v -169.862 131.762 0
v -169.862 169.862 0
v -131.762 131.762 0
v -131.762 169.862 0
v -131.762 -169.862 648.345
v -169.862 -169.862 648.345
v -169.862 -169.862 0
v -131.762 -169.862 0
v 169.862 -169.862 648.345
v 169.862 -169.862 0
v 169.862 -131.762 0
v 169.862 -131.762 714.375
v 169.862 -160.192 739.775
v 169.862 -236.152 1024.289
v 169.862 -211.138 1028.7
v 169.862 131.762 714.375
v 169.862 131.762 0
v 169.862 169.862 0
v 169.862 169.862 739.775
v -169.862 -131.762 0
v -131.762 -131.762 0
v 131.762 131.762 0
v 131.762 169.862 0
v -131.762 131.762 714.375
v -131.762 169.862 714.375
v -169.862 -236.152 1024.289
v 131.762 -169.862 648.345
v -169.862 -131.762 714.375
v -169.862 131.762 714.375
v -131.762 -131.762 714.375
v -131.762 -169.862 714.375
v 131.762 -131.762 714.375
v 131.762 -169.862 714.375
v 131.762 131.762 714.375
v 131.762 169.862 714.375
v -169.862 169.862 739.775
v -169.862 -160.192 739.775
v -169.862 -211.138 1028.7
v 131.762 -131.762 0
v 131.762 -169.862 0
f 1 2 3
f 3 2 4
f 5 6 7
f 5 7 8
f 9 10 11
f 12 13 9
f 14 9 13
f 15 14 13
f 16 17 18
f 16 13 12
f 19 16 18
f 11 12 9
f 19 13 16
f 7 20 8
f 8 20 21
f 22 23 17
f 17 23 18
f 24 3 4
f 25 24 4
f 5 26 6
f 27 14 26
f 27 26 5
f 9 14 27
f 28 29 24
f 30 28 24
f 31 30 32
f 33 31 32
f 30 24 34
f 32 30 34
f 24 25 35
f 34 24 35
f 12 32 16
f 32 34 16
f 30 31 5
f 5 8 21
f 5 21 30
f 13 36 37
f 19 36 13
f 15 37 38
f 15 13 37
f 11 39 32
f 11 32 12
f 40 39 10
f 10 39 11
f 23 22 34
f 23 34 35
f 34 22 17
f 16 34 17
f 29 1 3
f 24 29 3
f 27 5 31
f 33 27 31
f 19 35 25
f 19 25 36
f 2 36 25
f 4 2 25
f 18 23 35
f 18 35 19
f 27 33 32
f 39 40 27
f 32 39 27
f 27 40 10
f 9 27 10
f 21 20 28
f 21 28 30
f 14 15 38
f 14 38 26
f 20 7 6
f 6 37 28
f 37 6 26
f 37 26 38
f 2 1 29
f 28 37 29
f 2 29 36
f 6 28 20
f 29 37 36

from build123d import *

# Parameters (mm, degrees)
F0_W          = 38.1
F0_H          = 38.1
F1_DEPTH      = 739.775
F3_DEPTH      = 25.4
F6_DEPTH      = 169.8625
F6_DEPTH_BACK = 169.8625


with BuildPart() as f1:
    # F0 (on Top) → F1 (new body)
    with BuildSketch(Plane.XY):
        with Locations((-150.8125, 150.8125)):
            Rectangle(F0_W, F0_H)
        with Locations((-150.8125, -150.8125)):
            Rectangle(F0_W, F0_H)
        with Locations((150.8125, -150.8125)):
            Rectangle(F0_W, F0_H)
        with Locations((150.8125, 150.8125)):
            Rectangle(F0_W, F0_H)
    extrude(amount=F1_DEPTH)


with BuildPart() as f3:
    # F2 (on face) → F3 (new body)
    with BuildSketch(Plane.XY.offset(739.775)):
        Polygon((169.8625, 169.8625), (-131.7625, 169.8625), (-131.7625, 131.7625), (-169.8625, 131.7625), (-169.8625, -169.8625), (169.8625, -169.8625), align=None)
    extrude(amount=-F3_DEPTH)

    # F4: union F1
    add(f1.part)

    # F5 (on Right) → F6 (join, two sides)
    with BuildSketch(Plane.YZ) as f6_sk:
        Polygon((-169.8625, 739.775), (-160.192227, 739.775), (-211.1375, 1028.7), (-236.151617, 1024.289336), (-169.8625, 648.345073), align=None)
    extrude(amount=F6_DEPTH)
    extrude(f6_sk.sketch, amount=-F6_DEPTH_BACK)


solid = f3.part
